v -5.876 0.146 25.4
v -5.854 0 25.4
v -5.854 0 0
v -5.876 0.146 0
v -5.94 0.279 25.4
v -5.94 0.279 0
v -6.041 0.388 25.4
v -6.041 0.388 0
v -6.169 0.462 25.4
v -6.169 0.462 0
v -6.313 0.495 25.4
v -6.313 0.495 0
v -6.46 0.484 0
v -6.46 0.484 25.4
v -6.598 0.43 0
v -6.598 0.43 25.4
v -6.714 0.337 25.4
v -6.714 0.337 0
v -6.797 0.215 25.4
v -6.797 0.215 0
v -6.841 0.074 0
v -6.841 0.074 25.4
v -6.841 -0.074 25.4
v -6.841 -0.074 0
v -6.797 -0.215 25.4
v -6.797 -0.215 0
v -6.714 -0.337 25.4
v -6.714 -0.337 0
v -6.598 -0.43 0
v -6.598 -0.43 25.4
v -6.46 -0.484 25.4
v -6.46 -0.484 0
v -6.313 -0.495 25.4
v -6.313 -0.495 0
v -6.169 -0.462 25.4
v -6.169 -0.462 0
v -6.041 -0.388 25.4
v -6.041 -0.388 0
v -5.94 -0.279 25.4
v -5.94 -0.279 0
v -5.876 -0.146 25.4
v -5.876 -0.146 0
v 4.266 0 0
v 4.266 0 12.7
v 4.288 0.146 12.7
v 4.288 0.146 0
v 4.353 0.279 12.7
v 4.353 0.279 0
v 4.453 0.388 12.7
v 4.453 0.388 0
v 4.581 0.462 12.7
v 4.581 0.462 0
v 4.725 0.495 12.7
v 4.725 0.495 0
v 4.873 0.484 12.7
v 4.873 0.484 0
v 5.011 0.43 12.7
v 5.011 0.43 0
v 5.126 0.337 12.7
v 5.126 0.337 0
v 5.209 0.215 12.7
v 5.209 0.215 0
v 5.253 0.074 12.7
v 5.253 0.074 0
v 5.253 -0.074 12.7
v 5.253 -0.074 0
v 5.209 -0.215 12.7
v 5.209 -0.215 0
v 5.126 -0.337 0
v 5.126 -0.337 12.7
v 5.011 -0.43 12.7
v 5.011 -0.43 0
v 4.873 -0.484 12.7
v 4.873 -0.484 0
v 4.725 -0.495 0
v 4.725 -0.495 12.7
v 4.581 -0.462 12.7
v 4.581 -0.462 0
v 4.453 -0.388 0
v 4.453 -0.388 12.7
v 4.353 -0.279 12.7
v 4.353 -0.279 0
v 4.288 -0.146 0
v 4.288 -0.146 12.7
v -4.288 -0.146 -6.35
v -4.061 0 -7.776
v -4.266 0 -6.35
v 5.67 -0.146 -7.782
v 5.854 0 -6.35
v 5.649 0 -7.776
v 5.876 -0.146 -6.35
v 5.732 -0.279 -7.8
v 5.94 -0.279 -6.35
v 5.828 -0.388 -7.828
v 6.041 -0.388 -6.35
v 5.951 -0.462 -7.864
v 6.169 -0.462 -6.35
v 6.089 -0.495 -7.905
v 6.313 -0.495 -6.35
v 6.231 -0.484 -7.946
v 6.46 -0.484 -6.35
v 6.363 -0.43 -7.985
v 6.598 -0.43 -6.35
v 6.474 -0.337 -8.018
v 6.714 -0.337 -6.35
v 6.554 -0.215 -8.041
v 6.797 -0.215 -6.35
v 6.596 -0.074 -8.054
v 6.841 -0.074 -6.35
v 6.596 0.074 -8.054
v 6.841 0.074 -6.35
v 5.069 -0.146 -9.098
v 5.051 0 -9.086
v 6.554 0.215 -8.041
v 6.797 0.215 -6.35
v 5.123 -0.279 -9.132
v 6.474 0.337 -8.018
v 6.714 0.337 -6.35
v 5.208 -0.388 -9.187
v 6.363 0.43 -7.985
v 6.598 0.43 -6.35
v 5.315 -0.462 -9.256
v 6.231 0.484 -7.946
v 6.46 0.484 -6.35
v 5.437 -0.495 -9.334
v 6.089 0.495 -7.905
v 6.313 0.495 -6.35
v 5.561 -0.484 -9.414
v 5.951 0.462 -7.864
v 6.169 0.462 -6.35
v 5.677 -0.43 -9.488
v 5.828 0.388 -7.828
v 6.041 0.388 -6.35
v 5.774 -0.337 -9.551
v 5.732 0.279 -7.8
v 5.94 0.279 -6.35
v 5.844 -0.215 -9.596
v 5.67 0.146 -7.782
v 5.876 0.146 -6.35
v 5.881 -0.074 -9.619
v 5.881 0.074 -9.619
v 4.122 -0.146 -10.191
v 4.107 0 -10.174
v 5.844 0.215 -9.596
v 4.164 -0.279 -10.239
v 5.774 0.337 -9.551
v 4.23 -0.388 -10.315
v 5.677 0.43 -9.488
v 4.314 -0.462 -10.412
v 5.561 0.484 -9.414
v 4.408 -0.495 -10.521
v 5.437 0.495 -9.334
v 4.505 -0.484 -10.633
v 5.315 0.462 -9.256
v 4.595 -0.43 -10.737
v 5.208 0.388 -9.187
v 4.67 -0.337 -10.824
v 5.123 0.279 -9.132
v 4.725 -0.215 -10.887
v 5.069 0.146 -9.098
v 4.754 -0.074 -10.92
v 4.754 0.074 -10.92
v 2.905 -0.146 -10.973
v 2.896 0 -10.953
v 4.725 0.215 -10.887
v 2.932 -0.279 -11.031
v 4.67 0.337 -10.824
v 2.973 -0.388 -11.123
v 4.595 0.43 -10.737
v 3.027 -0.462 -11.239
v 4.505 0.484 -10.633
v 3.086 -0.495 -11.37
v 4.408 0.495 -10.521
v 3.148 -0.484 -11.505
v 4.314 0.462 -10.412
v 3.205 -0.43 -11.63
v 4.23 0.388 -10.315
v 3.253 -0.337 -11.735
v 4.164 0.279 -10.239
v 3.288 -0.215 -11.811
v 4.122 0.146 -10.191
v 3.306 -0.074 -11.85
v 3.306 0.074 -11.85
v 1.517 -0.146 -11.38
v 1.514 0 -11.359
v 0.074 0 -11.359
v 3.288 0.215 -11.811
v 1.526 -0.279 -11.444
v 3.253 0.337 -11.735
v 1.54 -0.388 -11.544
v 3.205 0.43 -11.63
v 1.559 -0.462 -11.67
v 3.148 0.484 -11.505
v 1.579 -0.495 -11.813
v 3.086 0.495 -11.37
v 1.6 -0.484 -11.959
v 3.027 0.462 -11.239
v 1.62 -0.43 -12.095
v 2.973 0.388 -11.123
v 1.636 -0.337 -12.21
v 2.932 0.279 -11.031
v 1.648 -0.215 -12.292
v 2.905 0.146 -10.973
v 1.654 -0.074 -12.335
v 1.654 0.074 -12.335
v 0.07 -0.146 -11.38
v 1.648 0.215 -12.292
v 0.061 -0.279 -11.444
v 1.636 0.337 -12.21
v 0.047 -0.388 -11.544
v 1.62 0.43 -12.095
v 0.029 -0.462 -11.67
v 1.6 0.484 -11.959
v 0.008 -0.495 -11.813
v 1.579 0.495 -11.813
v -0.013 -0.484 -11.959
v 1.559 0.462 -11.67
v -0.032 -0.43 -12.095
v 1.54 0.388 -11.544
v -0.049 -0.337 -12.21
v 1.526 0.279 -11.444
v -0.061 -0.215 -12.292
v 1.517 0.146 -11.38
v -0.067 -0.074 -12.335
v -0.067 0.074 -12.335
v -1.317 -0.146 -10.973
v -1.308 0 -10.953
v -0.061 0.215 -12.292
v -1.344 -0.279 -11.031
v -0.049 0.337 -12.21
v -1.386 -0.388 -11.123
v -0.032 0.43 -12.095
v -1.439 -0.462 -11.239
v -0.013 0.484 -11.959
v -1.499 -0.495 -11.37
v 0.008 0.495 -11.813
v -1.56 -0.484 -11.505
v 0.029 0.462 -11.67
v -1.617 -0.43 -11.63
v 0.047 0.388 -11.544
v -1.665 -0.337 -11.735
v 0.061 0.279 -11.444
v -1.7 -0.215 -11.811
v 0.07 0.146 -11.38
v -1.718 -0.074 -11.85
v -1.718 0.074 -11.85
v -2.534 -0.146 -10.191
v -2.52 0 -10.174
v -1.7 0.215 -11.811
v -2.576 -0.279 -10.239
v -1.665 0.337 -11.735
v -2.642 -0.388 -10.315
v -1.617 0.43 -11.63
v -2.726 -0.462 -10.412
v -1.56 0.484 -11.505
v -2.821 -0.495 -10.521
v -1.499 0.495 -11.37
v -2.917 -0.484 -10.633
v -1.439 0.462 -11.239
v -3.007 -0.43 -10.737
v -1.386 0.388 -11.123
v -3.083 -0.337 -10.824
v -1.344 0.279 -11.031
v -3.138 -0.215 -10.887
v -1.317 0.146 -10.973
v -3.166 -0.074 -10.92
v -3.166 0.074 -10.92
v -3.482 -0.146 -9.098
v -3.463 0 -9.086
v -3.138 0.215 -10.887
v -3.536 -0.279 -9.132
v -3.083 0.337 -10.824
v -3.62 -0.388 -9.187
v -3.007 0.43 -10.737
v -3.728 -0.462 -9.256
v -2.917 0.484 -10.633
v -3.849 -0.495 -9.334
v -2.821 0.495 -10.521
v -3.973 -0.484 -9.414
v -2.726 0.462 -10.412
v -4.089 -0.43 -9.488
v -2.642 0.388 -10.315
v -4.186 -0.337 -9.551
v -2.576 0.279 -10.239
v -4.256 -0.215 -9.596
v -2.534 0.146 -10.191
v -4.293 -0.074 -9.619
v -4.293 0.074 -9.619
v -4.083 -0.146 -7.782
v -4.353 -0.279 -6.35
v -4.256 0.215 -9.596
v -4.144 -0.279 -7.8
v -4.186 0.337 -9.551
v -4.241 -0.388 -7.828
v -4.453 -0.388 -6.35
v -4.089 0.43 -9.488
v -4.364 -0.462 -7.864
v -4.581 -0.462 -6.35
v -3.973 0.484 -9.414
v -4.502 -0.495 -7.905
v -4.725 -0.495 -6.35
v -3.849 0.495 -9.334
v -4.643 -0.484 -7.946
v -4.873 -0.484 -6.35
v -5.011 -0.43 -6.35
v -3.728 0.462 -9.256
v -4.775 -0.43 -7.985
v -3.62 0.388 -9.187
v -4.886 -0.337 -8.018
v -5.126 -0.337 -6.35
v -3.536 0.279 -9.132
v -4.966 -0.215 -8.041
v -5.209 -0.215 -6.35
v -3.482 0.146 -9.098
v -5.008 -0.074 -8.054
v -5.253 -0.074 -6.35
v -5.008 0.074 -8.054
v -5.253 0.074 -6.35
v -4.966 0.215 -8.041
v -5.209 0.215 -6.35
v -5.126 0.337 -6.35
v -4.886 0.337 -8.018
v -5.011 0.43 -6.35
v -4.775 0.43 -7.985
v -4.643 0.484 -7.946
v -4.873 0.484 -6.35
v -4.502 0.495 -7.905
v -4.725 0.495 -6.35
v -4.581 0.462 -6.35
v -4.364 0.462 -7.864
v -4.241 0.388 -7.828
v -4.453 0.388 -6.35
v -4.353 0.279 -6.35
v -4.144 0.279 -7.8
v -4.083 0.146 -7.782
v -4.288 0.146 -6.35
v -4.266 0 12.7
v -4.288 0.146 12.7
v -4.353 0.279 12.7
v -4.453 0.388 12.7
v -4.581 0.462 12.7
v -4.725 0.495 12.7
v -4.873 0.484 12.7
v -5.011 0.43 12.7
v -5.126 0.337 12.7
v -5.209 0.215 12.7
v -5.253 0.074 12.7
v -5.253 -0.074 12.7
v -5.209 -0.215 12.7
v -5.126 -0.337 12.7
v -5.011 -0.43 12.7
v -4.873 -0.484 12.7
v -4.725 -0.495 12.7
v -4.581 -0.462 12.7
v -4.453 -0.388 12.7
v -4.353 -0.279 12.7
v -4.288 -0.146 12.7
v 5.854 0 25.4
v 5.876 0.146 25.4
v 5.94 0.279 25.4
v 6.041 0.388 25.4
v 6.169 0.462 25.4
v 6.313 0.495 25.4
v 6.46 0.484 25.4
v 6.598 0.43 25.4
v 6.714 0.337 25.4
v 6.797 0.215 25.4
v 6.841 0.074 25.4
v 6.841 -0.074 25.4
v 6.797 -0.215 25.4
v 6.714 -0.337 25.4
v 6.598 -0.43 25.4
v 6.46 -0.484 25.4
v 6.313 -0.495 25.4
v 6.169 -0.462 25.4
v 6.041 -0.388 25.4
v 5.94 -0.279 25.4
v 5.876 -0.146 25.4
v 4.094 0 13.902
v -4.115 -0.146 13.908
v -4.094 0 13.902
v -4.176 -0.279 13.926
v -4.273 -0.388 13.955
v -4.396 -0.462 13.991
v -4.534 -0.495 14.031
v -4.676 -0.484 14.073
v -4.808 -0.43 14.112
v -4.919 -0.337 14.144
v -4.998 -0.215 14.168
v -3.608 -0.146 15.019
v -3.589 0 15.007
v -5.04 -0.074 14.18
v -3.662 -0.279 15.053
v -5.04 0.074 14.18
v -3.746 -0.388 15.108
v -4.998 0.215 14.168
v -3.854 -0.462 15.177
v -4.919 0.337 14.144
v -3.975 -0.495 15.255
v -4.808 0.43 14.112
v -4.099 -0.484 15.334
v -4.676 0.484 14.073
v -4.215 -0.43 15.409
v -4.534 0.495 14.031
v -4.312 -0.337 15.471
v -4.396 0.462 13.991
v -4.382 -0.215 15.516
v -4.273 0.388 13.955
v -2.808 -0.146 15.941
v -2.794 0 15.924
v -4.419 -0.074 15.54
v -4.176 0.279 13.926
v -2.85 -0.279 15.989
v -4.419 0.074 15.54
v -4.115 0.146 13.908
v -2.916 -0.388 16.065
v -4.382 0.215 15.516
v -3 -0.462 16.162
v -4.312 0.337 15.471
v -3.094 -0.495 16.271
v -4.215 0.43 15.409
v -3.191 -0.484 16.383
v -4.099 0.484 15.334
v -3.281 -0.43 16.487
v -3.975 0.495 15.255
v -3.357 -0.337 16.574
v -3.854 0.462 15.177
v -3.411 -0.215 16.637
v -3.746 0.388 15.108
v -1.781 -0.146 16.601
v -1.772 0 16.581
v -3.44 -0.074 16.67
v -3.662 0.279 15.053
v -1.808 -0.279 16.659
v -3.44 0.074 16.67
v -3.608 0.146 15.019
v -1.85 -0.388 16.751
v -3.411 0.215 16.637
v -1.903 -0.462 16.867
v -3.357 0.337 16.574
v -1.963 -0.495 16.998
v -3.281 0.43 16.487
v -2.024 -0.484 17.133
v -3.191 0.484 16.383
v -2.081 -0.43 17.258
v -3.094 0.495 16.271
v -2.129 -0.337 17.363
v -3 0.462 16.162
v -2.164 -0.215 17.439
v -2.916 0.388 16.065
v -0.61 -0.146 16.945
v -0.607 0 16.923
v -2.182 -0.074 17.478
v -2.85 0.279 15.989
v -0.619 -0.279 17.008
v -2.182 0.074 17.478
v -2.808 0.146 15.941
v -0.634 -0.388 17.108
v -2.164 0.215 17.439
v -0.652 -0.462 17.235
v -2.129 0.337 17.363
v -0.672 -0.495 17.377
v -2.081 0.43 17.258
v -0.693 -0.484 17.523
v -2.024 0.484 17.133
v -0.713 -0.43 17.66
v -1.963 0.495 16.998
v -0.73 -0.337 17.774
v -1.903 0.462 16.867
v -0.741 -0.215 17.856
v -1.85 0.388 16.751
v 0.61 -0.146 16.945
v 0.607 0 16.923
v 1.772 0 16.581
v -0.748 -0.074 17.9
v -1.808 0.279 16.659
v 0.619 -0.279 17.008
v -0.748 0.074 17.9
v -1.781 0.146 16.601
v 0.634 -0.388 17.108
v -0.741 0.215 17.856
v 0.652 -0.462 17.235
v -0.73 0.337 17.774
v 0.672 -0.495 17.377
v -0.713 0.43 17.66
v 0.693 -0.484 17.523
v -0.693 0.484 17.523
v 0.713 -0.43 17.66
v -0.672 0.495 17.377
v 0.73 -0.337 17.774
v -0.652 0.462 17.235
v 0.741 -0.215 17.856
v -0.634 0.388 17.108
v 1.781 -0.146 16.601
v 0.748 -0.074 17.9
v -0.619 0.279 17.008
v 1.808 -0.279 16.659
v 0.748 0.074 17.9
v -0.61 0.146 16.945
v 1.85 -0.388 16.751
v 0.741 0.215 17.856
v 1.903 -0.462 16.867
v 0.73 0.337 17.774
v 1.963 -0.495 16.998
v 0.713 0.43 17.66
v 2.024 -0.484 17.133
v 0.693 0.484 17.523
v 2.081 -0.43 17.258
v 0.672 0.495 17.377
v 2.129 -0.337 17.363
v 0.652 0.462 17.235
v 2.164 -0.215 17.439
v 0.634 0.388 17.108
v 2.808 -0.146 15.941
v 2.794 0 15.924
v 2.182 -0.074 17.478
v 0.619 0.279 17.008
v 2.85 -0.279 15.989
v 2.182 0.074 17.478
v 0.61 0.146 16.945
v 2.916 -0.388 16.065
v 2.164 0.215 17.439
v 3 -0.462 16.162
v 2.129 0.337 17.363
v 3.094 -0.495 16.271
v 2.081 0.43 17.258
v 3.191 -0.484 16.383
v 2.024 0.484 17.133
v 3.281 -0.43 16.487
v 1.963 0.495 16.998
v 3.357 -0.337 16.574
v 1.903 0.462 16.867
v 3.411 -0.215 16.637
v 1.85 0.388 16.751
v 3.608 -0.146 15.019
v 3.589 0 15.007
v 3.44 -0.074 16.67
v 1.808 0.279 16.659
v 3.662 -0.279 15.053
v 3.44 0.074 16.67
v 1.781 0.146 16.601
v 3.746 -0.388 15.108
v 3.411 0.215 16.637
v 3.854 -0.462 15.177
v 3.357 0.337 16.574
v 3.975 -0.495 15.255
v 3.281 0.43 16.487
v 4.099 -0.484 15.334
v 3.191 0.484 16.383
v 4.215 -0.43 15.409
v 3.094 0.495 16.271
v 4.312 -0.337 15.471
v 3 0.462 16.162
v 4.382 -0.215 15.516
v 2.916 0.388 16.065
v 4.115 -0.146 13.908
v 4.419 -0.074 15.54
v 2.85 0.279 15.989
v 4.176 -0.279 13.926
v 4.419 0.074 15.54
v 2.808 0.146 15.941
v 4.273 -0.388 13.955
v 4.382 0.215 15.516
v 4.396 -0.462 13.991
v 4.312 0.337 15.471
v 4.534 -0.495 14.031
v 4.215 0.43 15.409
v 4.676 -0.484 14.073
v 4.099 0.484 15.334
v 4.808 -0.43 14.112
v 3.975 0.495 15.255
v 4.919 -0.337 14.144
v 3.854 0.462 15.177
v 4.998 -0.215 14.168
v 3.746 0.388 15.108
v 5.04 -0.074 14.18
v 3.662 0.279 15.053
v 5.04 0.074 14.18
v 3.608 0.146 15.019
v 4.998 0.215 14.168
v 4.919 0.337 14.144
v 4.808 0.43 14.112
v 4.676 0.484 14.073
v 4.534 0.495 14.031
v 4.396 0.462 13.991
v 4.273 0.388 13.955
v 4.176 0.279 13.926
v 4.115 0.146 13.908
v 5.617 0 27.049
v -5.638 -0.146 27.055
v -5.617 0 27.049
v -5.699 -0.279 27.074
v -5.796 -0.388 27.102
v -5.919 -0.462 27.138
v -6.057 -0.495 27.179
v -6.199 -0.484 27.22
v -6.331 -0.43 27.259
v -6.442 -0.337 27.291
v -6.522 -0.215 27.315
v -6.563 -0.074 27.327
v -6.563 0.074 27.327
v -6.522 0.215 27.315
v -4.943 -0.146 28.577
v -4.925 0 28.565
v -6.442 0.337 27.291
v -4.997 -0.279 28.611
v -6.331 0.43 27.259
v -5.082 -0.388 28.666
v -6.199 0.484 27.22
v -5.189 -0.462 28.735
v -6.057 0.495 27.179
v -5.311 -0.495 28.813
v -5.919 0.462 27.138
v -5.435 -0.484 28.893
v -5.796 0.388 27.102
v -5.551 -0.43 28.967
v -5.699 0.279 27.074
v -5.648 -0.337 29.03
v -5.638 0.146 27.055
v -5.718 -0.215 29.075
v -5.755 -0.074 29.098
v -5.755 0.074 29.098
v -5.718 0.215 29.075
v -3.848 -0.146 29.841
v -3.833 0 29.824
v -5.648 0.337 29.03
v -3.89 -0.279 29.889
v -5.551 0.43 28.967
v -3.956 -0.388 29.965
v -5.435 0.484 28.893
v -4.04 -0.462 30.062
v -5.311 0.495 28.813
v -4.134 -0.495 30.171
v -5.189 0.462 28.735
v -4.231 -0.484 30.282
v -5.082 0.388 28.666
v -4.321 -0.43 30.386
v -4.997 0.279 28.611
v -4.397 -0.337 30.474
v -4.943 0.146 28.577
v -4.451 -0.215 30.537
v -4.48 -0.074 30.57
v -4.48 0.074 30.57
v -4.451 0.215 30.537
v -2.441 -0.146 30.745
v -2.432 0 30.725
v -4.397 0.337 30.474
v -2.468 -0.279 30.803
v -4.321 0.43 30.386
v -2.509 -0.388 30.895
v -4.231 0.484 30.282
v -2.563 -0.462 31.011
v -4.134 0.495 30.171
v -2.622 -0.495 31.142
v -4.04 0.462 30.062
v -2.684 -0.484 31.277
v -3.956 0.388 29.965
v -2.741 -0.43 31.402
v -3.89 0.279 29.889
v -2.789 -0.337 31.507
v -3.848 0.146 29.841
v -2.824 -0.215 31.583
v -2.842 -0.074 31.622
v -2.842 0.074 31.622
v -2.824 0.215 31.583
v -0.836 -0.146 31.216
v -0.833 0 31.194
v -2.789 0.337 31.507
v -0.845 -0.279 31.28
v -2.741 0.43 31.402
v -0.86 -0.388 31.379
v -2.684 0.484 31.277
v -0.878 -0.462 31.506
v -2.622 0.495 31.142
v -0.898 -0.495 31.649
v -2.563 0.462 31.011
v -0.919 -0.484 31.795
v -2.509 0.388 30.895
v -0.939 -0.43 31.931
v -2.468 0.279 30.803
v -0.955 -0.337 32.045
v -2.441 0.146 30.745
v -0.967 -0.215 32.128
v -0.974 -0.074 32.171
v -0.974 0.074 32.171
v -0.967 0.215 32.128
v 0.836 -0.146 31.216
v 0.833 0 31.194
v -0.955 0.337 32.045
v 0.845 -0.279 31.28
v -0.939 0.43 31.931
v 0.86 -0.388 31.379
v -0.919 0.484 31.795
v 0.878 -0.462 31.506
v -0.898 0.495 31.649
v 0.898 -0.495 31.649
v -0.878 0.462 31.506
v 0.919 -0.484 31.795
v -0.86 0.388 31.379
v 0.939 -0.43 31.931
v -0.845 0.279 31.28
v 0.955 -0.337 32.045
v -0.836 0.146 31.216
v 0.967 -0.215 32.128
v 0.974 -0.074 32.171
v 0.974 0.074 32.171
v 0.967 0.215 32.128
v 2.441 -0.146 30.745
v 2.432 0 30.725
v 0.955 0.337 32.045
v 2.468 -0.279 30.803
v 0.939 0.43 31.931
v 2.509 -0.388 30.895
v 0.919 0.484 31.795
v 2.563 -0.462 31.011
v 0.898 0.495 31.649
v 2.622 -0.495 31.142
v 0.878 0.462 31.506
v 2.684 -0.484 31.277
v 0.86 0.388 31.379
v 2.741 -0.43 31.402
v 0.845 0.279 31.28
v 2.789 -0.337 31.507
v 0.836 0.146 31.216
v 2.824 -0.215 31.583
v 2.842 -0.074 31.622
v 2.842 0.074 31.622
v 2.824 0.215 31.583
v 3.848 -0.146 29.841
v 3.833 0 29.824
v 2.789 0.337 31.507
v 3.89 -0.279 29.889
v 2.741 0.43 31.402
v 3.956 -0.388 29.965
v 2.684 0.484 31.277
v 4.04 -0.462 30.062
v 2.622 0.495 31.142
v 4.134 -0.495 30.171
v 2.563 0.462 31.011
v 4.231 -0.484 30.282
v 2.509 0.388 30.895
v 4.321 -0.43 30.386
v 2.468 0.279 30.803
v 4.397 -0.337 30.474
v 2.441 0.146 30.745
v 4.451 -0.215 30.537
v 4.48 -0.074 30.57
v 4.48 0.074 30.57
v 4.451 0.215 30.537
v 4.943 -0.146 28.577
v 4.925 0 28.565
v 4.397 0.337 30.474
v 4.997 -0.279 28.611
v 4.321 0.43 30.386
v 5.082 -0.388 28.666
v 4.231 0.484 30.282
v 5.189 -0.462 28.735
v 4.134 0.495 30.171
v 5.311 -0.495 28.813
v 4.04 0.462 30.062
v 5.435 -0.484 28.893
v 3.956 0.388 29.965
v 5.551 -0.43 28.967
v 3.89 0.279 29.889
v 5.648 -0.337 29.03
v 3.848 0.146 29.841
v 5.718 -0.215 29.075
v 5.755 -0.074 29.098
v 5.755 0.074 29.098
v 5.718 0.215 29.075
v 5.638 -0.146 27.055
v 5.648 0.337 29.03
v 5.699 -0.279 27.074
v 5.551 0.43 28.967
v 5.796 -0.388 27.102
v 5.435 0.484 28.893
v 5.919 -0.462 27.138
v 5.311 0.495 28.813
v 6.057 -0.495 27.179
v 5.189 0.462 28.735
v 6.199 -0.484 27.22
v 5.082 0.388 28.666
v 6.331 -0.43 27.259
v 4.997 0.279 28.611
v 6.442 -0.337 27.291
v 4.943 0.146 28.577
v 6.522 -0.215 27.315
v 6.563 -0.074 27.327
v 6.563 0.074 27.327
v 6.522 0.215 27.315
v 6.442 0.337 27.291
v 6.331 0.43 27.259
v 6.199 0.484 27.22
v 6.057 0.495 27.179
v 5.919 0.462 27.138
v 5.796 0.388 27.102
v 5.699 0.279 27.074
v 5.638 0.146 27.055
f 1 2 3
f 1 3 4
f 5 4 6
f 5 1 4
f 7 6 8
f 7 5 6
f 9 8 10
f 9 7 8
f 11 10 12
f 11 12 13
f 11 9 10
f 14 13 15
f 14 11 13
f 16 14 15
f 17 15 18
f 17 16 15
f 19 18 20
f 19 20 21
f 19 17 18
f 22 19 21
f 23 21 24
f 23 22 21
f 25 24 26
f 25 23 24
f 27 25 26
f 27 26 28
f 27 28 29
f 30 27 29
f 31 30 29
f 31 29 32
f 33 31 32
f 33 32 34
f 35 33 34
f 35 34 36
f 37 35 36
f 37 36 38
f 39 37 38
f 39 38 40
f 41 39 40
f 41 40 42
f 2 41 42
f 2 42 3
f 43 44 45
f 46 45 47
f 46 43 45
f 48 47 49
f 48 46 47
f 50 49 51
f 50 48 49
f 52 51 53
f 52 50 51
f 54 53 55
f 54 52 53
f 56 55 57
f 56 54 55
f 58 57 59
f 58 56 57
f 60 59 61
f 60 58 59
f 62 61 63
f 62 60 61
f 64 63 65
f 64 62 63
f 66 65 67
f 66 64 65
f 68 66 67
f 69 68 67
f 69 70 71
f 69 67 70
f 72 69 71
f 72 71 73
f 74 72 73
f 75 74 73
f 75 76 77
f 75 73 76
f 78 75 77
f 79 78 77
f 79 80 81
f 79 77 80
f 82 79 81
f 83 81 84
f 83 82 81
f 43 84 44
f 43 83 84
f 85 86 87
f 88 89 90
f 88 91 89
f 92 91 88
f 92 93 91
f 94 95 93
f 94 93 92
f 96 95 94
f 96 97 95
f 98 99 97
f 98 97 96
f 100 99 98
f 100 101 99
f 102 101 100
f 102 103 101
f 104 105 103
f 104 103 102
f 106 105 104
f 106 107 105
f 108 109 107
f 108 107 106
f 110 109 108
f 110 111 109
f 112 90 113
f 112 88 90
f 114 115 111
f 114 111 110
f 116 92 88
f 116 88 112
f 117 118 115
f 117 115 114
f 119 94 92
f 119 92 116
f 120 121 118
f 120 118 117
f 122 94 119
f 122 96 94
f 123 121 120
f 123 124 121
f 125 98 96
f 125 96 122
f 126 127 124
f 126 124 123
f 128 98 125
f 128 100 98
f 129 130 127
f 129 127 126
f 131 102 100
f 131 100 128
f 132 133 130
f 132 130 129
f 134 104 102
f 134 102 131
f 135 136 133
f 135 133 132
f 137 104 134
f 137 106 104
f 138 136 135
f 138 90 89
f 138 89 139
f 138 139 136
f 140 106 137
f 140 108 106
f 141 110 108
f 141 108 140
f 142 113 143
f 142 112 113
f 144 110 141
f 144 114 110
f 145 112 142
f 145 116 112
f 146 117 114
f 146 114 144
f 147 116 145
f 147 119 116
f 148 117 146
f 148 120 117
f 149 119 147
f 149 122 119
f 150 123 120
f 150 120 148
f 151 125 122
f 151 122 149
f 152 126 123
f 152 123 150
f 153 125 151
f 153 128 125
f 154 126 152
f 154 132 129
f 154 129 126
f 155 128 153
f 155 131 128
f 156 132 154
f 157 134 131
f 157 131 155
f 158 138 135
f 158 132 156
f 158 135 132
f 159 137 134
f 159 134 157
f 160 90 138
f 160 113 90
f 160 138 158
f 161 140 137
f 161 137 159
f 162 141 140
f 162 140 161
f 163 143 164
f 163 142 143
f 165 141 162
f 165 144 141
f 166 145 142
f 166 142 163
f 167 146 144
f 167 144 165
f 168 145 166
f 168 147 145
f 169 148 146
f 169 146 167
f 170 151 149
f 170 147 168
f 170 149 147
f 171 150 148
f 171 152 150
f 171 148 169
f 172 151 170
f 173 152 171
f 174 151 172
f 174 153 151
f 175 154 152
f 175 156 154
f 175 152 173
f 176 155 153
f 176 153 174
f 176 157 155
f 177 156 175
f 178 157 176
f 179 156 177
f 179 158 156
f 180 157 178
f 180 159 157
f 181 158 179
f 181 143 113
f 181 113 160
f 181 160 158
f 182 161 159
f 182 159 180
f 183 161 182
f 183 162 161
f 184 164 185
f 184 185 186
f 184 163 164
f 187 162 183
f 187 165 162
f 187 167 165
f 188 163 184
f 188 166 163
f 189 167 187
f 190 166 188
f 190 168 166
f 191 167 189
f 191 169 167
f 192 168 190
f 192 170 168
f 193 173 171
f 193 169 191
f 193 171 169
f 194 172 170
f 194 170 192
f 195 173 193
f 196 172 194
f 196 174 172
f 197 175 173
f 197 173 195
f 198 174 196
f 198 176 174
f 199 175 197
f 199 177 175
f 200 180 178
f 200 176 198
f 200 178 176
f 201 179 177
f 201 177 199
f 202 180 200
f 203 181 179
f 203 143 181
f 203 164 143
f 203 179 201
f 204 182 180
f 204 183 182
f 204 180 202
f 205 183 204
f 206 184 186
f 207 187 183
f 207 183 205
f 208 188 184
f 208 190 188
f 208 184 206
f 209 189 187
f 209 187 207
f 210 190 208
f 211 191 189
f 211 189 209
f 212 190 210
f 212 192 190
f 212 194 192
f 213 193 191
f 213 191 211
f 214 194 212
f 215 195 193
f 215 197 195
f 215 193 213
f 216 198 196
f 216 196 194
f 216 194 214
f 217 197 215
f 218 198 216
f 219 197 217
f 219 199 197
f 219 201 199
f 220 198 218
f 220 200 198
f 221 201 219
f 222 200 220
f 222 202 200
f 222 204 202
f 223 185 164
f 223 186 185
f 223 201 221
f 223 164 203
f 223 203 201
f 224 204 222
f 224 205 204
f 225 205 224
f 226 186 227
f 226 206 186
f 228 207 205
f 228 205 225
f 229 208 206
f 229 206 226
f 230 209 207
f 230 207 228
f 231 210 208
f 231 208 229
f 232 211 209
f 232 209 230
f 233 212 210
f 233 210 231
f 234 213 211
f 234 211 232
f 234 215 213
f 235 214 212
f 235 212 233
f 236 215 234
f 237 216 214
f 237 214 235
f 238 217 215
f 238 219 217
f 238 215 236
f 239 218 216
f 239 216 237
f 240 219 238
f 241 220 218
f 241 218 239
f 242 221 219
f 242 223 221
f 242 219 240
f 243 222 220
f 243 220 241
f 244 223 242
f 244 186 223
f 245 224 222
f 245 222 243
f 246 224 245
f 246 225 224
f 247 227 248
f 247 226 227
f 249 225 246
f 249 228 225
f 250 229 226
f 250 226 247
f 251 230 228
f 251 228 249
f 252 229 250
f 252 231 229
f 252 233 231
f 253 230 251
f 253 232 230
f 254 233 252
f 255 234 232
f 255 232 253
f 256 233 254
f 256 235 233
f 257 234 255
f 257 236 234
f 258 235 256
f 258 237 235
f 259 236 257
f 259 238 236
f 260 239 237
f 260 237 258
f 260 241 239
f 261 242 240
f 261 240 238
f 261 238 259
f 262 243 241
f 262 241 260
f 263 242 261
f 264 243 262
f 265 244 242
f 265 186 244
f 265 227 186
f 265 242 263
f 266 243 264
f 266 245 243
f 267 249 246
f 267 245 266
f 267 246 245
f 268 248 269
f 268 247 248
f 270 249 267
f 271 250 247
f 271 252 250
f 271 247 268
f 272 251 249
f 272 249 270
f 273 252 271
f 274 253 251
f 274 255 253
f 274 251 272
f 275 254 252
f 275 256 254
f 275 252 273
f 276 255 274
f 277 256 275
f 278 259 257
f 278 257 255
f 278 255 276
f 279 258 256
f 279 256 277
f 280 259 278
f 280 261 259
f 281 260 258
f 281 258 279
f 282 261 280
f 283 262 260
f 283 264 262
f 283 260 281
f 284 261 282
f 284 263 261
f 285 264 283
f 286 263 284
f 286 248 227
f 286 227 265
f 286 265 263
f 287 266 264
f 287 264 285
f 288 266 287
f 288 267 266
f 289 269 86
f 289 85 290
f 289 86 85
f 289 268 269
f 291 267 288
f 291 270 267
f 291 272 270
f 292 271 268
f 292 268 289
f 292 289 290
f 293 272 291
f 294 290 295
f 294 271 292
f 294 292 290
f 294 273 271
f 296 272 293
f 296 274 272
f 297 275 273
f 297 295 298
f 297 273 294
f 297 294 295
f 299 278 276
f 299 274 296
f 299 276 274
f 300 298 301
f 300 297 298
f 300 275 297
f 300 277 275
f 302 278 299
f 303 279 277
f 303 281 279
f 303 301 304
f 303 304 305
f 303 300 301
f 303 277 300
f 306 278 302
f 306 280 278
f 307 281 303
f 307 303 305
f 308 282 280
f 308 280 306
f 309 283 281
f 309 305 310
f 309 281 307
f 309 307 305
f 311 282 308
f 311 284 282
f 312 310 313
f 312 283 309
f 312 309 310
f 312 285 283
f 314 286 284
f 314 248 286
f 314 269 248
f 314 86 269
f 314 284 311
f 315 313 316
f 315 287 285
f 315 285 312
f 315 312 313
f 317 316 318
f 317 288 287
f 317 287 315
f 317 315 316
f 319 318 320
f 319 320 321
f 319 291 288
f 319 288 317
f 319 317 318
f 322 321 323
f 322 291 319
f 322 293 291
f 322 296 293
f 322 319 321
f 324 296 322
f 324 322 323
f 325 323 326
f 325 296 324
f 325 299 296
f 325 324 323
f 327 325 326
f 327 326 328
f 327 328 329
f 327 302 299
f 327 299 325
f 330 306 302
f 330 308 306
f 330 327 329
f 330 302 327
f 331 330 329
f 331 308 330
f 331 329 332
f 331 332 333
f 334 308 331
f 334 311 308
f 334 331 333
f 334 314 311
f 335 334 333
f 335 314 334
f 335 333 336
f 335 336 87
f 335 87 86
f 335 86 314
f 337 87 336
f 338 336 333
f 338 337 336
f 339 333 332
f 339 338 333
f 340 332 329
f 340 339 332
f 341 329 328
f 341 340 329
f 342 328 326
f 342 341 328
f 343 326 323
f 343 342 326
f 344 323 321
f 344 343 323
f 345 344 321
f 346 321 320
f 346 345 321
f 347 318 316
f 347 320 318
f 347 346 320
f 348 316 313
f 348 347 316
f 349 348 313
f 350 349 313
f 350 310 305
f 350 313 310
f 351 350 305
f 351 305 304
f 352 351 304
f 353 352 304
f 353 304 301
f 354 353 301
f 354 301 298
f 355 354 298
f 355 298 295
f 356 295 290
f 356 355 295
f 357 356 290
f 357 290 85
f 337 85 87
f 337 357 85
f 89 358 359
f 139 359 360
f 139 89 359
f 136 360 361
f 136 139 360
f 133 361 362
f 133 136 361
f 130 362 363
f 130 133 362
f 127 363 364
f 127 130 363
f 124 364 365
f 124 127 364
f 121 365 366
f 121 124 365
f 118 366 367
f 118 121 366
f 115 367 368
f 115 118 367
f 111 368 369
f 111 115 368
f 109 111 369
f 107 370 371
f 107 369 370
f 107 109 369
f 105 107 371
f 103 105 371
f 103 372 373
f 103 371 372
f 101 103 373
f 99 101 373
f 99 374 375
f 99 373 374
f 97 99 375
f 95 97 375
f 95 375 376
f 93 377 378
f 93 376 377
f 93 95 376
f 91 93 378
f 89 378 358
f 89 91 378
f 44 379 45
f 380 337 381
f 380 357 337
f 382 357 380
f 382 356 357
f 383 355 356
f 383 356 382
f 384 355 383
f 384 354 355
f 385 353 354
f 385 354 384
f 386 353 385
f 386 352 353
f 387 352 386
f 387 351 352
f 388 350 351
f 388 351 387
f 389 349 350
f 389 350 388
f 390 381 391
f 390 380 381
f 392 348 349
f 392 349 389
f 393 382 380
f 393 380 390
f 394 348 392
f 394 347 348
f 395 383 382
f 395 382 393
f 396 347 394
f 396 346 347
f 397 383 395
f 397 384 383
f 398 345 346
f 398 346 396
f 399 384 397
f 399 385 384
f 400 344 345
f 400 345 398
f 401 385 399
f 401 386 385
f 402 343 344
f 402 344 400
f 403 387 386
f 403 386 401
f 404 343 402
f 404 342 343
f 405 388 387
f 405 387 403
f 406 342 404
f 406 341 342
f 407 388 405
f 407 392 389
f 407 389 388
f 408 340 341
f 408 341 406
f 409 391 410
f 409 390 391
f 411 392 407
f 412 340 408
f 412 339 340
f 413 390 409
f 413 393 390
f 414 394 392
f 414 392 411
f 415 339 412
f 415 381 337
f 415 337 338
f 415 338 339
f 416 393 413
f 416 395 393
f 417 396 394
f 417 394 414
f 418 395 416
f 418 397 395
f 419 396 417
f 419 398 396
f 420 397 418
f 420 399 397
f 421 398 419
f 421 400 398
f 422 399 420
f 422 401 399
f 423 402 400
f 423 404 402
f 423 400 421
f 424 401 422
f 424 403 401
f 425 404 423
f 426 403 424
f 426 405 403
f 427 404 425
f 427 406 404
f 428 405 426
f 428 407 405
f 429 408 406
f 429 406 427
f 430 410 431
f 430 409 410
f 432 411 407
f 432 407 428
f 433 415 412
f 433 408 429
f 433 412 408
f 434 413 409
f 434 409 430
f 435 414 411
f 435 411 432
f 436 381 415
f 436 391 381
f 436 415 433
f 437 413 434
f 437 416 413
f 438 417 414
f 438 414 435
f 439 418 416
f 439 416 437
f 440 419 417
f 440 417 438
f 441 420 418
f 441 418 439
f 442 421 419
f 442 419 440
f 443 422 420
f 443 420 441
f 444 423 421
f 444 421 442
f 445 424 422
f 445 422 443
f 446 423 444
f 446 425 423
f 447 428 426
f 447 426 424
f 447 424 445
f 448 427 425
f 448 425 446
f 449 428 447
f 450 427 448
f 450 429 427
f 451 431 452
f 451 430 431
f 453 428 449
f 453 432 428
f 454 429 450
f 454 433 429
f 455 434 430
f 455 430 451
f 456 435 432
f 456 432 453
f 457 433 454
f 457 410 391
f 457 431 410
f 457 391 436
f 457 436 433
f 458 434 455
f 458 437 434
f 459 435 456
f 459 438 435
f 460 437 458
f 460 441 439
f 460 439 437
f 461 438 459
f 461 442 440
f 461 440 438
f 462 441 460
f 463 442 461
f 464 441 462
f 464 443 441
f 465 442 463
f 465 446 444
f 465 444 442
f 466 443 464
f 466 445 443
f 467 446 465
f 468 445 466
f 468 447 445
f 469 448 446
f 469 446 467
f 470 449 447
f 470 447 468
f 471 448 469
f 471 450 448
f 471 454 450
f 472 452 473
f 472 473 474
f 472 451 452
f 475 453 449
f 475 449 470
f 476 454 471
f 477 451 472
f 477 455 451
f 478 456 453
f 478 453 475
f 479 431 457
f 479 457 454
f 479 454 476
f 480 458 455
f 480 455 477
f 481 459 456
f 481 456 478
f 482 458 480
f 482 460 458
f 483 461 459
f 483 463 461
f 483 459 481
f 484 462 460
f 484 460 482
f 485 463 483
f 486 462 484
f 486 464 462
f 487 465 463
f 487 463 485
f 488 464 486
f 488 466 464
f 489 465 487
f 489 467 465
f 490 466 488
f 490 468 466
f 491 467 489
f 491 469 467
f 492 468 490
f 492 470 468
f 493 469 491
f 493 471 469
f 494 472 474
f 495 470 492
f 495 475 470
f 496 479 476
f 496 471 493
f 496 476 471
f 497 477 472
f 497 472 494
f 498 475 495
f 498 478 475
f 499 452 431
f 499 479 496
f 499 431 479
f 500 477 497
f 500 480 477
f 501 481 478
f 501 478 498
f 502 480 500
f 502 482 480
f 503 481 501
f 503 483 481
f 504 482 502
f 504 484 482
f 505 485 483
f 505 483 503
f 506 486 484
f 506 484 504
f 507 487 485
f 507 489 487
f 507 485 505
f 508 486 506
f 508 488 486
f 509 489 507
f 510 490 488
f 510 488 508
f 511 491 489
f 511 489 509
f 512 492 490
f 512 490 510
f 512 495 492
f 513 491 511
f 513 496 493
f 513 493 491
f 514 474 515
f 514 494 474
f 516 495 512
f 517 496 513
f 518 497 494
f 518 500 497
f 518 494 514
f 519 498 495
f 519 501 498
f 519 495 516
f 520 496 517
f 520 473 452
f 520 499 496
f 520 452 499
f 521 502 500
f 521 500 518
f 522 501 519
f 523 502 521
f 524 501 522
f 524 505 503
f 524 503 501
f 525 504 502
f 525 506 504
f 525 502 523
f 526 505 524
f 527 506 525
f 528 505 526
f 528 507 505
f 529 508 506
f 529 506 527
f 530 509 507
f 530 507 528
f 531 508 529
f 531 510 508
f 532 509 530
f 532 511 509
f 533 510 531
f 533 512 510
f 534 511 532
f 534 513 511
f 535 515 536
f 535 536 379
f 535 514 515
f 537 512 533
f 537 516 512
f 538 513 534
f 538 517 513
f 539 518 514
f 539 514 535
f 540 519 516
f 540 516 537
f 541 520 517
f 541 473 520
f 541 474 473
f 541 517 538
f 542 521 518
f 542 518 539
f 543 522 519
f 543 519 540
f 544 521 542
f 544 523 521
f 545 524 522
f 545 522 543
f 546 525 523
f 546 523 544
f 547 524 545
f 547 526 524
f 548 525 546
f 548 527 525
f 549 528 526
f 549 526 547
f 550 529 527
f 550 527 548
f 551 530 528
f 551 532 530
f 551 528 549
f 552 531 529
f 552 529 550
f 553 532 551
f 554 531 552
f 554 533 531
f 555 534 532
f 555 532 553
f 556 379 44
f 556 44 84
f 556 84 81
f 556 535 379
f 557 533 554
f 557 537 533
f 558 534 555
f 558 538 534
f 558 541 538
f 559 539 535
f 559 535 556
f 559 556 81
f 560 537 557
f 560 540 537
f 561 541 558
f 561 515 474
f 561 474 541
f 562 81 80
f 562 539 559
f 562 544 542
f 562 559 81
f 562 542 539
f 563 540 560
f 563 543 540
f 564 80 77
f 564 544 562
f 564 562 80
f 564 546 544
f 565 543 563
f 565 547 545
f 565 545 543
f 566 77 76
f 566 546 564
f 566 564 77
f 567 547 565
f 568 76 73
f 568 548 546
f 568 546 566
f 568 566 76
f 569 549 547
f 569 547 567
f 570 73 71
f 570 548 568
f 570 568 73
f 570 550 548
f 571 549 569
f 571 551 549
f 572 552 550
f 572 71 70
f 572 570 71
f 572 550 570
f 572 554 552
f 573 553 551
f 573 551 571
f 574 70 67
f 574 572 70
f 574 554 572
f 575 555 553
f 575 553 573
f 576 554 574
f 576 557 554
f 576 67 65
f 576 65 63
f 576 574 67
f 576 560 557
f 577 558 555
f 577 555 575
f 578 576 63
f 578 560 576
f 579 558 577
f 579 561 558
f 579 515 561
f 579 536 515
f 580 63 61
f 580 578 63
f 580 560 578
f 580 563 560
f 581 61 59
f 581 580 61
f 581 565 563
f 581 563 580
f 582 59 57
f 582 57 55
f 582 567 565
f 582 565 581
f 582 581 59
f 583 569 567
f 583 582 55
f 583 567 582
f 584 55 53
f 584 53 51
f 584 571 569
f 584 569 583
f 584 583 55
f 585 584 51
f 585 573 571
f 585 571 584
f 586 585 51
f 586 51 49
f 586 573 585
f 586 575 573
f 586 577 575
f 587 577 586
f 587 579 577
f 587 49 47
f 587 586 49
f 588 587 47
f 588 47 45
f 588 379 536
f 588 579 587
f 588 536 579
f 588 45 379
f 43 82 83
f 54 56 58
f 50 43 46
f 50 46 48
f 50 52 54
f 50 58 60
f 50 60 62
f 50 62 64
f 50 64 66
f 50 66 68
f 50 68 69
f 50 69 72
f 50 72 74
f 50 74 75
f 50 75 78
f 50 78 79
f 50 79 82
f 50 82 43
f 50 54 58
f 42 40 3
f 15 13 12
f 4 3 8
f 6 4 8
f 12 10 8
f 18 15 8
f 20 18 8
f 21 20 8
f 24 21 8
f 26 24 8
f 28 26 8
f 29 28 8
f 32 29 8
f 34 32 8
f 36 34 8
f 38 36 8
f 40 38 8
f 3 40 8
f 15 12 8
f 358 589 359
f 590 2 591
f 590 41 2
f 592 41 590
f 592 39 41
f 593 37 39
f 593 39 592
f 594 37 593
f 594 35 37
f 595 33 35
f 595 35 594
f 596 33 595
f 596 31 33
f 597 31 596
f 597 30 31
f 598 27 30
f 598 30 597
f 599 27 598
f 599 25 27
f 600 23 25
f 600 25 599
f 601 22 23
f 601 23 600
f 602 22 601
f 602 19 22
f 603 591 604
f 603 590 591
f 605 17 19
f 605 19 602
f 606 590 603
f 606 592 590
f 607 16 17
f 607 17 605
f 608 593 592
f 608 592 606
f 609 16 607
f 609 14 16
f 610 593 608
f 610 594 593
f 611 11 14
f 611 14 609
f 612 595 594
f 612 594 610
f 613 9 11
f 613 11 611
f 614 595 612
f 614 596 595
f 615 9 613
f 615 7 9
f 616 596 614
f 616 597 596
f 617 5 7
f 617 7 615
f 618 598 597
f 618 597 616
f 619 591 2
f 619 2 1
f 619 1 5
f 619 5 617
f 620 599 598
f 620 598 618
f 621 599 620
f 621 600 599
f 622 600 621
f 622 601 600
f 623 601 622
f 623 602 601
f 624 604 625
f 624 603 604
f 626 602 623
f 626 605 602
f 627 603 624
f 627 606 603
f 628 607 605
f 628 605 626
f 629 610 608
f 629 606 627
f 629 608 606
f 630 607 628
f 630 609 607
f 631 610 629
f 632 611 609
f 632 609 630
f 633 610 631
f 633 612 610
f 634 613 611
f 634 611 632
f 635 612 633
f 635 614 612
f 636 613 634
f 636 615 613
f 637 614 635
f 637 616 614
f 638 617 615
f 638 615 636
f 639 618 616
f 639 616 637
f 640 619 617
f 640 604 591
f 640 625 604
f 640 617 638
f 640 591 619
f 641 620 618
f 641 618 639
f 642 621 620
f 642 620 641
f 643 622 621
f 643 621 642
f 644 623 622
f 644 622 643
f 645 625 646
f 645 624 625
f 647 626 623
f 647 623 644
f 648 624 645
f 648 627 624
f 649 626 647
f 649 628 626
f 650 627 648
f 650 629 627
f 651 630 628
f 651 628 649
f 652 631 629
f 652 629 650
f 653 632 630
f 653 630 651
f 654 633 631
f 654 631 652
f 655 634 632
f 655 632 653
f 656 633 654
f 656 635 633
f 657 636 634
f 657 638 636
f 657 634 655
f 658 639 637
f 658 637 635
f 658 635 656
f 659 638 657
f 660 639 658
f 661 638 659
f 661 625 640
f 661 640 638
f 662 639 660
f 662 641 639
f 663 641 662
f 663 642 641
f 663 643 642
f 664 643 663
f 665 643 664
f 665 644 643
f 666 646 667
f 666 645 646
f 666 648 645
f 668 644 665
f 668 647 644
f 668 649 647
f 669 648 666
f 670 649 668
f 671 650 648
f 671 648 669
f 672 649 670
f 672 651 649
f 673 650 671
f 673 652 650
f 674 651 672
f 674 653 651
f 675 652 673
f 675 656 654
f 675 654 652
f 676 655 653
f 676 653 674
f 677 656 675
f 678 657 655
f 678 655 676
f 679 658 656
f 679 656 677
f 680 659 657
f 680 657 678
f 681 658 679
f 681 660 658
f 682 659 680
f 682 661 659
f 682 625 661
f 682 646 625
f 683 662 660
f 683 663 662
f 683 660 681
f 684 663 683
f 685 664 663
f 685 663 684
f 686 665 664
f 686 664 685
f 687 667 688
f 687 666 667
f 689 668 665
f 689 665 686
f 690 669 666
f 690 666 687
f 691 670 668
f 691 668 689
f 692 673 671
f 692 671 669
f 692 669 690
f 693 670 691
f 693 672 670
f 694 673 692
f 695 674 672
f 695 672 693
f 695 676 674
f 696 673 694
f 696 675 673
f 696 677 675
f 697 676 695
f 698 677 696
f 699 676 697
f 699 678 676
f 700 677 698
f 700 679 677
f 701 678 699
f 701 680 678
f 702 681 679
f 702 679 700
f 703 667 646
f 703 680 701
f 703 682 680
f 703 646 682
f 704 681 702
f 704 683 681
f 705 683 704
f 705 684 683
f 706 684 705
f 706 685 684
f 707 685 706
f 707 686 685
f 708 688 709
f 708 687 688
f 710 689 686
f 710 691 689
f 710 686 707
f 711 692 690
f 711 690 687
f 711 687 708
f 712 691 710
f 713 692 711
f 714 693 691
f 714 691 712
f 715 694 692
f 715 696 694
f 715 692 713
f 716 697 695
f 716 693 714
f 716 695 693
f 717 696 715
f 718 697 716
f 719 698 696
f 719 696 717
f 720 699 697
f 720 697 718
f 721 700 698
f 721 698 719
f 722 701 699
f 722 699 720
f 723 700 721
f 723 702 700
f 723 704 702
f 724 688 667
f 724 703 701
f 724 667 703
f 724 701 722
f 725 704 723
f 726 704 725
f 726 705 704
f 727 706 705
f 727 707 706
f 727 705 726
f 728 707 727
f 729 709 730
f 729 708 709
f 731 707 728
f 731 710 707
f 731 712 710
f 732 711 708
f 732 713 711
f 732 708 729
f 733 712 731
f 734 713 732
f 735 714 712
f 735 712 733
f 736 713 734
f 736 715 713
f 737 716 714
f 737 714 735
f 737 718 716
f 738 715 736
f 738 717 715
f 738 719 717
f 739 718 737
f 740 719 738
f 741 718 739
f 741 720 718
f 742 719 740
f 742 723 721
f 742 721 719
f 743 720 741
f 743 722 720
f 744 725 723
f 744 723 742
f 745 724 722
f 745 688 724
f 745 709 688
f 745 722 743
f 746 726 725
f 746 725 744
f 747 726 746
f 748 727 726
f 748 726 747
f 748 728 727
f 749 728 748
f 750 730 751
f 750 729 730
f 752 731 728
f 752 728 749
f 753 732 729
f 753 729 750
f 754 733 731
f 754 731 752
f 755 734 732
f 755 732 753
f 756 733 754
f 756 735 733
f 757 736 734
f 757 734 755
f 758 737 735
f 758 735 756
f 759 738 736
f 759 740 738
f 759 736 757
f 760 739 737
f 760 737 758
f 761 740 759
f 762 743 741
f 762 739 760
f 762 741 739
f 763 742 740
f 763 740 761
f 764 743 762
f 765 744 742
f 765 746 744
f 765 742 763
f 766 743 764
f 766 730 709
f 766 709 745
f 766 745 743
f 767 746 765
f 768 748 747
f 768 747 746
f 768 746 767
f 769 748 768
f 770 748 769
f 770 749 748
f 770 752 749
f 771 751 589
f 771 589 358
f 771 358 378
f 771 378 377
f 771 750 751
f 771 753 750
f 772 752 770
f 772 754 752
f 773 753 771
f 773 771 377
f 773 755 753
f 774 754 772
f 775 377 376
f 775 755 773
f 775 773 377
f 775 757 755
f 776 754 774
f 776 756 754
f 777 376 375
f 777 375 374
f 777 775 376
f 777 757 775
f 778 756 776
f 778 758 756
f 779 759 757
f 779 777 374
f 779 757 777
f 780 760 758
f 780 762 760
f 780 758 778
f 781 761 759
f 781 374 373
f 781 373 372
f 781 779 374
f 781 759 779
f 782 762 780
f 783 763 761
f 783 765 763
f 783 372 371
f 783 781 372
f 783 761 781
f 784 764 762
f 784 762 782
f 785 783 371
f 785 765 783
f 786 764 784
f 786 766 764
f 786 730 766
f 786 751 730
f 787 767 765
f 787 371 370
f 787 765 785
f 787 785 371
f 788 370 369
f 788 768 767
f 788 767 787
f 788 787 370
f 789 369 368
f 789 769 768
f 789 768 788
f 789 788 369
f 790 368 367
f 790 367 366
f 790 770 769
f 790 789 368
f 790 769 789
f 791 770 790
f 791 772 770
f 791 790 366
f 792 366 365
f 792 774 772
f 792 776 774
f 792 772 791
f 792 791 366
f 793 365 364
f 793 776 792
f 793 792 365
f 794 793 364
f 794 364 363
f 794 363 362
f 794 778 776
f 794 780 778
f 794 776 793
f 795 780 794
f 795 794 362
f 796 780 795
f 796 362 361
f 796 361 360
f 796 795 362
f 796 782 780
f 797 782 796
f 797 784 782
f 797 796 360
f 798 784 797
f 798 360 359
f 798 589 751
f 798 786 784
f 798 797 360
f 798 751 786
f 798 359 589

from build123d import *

# Parameters (mm, degrees)
F1_R = 0.496094


with BuildPart() as f2:
    # F2: sweep along a path in F0
    with BuildLine(Plane.XZ) as f2_path:
        Line((-6.35, 0), (-6.35, 25.4))
        ThreePointArc((-6.35, 25.4), (0, 31.75), (6.35, 25.4))
        Line((6.35, 25.4), (6.35, -6.35))
        ThreePointArc((6.35, -6.35), (0.79375, -11.90625), (-4.7625, -6.35))
        Line((-4.7625, -6.35), (-4.7625, 12.7))
        ThreePointArc((-4.7625, 12.7), (0, 17.4625), (4.7625, 12.7))
        Line((4.7625, 12.7), (4.7625, 0))
    # F1 (on Top) → F2 (sweep)
    with BuildSketch(Plane.XY):
        with Locations((-6.35, 0)):
            Circle(F1_R)
    sweep(path=f2_path.line)


solid = f2.part
